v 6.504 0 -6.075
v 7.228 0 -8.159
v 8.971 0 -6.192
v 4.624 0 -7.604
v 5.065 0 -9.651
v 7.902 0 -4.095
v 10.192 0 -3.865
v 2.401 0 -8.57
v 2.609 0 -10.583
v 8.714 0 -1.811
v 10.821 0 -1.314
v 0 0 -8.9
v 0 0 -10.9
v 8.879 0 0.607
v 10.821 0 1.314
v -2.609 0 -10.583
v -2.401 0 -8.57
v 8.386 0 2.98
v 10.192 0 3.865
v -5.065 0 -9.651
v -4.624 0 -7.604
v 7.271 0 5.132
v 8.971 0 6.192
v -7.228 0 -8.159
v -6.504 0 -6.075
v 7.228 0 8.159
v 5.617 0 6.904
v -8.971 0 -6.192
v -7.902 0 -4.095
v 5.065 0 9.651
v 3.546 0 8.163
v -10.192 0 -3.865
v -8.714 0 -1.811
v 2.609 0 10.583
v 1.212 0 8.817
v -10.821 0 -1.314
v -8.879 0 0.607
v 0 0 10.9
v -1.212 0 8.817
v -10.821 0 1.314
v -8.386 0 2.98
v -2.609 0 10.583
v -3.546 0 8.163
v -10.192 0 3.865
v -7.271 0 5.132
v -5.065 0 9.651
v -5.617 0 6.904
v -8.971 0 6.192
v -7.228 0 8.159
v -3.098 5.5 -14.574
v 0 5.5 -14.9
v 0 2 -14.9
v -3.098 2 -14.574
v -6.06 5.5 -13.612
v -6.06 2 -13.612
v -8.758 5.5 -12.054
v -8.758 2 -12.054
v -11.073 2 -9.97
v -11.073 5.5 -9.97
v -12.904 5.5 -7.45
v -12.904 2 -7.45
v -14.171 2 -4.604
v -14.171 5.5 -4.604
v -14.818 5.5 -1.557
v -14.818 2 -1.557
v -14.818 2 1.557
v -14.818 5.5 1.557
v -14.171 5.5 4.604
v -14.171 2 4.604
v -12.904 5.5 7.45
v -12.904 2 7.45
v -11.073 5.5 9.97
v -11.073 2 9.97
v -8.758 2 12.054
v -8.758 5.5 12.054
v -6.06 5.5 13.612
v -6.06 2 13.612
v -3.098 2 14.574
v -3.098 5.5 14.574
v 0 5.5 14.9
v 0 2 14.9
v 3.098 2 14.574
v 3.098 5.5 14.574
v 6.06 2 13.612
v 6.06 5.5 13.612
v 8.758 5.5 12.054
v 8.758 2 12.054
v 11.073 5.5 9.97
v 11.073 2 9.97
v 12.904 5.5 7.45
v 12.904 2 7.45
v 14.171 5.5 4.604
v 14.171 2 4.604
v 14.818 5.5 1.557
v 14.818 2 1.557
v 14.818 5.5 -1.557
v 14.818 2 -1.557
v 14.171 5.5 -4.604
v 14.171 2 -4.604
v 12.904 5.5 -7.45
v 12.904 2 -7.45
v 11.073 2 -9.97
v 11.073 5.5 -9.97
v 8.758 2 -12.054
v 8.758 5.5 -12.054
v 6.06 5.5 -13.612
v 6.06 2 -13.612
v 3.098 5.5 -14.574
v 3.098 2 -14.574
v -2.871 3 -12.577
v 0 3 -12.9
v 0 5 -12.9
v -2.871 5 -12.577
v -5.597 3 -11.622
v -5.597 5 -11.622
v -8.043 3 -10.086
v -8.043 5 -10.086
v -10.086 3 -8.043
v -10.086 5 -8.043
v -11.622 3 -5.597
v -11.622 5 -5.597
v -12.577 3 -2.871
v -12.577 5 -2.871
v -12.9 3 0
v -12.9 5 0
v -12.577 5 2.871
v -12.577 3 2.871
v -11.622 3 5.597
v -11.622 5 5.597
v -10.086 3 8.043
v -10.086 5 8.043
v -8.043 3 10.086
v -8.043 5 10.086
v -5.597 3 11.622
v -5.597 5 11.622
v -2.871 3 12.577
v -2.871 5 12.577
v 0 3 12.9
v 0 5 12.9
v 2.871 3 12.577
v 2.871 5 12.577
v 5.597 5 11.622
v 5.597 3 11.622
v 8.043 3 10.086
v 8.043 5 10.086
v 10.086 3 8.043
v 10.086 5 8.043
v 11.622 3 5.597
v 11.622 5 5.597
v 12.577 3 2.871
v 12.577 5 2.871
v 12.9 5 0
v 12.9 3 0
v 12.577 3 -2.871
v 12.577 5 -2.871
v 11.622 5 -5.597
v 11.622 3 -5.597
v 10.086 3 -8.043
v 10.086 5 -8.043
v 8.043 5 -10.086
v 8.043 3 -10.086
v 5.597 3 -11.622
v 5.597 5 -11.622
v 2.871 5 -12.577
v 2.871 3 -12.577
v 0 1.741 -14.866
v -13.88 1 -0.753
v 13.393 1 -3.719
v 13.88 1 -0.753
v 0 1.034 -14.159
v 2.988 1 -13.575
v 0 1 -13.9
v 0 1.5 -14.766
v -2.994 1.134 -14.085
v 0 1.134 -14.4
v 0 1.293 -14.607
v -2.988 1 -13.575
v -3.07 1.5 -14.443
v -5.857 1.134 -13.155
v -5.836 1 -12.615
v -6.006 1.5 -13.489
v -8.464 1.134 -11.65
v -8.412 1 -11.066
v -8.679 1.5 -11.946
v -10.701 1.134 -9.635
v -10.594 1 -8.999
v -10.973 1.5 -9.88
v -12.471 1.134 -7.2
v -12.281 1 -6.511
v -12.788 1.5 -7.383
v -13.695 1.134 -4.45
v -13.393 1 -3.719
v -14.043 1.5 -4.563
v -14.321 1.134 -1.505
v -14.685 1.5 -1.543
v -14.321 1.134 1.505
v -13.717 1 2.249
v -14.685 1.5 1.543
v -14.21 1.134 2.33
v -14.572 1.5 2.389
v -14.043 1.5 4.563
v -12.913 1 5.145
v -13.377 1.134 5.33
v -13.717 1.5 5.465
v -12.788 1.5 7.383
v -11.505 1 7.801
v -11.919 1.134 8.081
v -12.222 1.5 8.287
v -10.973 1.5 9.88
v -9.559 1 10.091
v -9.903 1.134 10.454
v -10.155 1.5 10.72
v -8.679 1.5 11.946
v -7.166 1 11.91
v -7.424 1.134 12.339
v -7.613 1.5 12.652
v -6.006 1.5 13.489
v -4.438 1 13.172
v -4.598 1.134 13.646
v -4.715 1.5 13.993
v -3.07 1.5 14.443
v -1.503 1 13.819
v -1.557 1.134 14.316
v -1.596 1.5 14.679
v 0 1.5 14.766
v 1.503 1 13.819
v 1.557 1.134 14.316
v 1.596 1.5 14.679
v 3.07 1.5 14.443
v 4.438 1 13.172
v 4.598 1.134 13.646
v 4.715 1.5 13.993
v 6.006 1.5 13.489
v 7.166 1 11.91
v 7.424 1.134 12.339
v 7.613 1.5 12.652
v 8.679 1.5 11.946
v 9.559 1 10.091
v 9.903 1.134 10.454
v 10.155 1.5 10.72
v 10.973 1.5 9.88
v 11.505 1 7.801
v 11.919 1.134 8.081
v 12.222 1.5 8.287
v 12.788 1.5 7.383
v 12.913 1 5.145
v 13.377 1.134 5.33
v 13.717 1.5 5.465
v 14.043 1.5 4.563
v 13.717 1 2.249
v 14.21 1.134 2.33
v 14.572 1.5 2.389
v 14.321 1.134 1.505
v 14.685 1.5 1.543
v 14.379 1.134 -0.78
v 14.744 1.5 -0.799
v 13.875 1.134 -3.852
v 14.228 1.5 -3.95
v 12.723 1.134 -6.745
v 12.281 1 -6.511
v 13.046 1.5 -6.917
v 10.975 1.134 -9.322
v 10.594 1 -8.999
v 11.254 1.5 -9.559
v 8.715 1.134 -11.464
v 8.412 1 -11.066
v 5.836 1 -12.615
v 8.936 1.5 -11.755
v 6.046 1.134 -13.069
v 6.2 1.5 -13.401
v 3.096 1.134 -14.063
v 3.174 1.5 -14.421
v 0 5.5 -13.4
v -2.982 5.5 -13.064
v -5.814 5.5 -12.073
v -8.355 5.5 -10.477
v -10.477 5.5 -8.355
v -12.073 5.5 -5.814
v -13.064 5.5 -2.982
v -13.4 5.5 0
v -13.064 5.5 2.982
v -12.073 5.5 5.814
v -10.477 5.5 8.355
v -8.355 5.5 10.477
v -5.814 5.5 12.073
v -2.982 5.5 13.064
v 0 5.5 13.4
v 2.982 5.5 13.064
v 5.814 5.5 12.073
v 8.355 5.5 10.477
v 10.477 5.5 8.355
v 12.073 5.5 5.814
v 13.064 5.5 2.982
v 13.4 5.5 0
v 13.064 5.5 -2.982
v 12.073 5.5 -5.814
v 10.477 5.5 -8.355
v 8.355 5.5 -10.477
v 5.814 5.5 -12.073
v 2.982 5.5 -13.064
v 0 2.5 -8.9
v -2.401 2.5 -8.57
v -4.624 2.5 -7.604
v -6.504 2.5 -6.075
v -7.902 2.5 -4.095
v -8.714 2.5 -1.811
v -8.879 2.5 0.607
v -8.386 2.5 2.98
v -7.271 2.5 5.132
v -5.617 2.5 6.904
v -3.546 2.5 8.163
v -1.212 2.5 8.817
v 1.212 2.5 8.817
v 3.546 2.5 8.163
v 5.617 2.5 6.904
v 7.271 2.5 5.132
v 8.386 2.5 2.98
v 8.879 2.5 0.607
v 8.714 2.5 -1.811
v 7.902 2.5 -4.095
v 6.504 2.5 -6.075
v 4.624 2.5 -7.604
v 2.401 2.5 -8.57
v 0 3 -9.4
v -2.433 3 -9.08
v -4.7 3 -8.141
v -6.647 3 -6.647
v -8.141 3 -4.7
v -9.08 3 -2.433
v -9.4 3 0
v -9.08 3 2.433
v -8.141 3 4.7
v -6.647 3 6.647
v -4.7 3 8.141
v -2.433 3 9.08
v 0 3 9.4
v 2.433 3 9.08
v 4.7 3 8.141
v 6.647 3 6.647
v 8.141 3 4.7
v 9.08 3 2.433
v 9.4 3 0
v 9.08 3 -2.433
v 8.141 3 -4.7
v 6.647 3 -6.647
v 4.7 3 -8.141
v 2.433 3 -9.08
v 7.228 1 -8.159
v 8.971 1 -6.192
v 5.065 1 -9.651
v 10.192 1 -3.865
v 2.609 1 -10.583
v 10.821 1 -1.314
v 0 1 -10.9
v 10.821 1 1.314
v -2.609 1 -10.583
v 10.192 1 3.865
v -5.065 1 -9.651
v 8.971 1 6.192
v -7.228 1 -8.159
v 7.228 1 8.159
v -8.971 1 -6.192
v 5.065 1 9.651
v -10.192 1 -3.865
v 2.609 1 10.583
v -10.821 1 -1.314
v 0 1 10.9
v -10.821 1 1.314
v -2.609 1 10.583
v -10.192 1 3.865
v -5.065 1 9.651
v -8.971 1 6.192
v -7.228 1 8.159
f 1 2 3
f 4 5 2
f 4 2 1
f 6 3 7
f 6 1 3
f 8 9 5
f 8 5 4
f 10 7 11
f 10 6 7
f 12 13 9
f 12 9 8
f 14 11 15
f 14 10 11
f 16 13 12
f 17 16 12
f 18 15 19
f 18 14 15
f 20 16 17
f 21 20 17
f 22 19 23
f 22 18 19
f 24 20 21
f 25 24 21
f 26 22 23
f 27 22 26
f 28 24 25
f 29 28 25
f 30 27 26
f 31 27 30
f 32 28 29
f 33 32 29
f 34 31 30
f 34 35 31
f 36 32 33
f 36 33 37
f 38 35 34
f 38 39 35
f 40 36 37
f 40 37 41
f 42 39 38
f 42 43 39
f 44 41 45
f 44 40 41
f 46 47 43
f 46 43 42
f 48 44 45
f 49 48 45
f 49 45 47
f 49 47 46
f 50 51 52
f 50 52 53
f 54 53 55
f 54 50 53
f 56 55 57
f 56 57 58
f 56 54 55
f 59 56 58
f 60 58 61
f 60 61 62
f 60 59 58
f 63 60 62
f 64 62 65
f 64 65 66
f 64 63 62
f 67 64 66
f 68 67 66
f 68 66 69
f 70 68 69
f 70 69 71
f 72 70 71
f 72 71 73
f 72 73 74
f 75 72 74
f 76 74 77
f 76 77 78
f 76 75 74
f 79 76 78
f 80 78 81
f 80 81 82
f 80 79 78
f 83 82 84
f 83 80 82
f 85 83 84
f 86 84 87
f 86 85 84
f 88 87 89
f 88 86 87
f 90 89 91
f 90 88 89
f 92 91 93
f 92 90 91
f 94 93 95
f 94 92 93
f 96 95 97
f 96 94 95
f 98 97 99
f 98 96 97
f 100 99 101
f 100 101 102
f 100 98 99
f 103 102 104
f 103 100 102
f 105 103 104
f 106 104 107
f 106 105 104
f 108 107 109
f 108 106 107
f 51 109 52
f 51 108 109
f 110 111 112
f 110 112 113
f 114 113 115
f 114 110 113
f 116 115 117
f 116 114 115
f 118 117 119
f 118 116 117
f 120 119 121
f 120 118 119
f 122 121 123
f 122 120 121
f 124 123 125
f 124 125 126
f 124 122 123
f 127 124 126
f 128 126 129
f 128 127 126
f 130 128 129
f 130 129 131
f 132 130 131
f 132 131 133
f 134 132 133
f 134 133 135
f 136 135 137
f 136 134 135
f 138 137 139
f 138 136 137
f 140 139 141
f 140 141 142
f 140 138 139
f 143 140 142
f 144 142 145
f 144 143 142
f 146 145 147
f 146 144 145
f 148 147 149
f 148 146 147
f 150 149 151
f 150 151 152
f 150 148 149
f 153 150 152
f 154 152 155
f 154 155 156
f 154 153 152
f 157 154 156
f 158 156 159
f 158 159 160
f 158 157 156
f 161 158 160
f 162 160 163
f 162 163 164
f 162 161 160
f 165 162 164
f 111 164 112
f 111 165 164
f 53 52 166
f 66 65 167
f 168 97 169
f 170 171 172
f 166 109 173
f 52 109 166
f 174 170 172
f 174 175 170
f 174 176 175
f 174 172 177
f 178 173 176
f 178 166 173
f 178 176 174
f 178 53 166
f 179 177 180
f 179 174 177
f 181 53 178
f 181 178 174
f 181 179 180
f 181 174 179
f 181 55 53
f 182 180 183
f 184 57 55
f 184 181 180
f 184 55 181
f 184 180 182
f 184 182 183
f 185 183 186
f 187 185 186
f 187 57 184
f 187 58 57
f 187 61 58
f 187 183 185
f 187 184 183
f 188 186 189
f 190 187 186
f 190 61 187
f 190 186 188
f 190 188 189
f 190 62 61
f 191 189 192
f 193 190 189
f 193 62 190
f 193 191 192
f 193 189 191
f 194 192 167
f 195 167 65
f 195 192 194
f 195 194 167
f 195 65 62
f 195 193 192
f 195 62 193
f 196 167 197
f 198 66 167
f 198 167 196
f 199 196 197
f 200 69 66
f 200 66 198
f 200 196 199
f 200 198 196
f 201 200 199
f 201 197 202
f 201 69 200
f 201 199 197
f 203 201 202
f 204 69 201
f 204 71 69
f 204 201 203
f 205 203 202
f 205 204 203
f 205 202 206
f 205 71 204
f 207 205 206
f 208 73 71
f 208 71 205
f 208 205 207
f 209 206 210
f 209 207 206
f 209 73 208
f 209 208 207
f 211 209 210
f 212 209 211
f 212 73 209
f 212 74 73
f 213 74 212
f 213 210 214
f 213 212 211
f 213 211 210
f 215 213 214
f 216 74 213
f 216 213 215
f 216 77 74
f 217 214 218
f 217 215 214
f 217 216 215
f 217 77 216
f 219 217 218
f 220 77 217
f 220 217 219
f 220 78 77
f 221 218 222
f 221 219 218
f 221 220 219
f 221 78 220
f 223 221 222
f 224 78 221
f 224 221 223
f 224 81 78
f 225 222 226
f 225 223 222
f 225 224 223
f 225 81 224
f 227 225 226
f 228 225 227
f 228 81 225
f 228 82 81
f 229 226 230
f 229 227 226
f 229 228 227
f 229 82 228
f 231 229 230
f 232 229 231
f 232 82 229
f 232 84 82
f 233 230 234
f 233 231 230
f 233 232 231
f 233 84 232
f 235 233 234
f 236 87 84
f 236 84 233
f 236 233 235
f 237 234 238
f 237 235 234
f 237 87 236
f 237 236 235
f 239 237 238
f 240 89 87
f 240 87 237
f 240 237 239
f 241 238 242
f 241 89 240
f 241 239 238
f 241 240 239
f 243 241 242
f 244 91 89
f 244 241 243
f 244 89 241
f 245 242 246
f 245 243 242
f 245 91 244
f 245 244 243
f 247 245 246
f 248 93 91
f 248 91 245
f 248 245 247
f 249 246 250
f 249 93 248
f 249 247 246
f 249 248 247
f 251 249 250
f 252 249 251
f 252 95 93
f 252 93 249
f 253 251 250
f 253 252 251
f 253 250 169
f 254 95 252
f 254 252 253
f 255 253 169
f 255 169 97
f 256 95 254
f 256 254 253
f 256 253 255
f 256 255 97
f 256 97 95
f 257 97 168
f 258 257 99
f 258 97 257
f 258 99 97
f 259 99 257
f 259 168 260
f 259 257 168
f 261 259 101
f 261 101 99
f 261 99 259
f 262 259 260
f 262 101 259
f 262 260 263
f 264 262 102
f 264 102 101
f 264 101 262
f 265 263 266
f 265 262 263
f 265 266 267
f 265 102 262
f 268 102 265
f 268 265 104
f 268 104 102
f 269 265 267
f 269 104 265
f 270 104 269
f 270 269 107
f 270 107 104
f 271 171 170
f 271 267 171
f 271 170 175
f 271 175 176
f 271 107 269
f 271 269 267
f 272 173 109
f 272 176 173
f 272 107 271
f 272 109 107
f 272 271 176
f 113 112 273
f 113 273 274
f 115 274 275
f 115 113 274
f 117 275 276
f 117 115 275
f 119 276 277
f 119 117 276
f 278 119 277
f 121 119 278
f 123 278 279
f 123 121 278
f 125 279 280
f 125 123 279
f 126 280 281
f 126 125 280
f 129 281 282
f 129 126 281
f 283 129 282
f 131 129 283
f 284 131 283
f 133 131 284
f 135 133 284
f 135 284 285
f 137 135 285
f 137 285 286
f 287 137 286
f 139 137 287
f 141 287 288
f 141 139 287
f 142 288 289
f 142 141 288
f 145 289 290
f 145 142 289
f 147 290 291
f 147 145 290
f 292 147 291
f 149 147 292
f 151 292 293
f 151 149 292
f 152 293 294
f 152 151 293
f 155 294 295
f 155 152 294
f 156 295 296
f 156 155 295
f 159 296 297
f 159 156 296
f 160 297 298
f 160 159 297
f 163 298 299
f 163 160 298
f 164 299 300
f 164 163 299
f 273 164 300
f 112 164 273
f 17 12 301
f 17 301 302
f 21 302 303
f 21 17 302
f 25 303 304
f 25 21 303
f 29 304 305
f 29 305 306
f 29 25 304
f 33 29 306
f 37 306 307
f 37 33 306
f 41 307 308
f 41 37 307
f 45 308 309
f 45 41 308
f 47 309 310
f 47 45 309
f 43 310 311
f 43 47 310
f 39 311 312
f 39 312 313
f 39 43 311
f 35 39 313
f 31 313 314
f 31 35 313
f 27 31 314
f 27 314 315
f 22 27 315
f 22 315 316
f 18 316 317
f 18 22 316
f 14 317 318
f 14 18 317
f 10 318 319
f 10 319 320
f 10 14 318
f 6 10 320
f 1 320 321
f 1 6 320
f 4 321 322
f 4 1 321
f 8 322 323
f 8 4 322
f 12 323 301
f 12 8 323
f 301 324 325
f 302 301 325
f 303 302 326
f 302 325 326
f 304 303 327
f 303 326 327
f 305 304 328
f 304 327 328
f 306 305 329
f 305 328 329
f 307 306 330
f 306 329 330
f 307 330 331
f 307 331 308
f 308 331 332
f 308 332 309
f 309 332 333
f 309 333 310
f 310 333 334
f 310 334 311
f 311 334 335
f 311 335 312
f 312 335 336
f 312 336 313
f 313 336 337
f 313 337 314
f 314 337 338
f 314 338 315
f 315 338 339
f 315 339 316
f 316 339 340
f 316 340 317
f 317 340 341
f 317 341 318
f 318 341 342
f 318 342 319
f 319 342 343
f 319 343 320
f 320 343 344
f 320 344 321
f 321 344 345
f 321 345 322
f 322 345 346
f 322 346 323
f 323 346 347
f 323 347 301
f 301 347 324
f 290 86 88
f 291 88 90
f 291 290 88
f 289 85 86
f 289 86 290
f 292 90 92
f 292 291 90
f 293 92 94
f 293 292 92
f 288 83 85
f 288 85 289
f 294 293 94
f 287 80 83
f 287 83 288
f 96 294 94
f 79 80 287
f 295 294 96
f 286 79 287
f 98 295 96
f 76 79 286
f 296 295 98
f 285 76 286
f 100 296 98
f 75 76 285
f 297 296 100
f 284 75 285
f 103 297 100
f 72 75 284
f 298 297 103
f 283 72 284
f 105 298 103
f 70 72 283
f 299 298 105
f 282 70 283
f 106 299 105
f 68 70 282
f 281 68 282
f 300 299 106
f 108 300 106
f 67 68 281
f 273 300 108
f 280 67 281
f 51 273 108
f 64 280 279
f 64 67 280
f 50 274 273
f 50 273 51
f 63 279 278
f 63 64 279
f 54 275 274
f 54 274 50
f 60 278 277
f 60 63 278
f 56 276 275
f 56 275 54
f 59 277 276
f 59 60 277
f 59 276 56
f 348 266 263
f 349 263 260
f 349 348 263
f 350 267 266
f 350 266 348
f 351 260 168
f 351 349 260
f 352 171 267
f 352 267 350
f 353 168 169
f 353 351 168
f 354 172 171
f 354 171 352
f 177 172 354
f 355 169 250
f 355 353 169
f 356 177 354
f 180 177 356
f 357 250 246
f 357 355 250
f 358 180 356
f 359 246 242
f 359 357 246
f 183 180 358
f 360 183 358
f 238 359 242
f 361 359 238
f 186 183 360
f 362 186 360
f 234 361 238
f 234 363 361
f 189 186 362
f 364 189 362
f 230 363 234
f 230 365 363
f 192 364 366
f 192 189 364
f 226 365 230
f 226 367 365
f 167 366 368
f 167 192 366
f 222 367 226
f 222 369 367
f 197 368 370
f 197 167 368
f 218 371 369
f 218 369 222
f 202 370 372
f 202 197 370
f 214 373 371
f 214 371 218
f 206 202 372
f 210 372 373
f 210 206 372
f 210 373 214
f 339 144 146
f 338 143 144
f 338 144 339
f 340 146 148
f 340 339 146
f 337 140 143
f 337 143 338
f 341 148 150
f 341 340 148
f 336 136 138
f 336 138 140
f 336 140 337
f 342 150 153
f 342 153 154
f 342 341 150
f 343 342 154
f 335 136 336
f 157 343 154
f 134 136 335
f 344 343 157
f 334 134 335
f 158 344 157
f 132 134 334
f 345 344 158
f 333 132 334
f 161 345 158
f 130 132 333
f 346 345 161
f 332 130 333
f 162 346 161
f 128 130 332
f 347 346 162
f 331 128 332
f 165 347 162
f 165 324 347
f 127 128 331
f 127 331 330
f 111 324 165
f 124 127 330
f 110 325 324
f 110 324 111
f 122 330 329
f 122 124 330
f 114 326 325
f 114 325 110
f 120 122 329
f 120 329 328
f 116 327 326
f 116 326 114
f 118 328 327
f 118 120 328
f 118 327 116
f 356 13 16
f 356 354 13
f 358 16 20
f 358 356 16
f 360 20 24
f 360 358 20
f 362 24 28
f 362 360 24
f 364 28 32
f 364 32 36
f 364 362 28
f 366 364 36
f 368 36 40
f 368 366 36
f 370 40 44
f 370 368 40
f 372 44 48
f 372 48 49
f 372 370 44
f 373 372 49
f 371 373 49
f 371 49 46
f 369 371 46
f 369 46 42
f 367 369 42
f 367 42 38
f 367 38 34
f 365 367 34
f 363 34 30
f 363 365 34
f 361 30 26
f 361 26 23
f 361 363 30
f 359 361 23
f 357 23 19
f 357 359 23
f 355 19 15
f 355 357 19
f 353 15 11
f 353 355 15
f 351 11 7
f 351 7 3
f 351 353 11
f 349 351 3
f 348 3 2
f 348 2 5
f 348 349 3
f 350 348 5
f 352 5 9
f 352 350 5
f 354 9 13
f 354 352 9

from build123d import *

# Parameters (mm, degrees)
FILLET1_R     = 1
CHAMFER1_SIZE = 0.5


with BuildPart() as part:
    # Sketch1 → Revolve1 (revolve)
    with BuildSketch(Plane.XY, mode=Mode.PRIVATE) as revolve1_sk:
        Polygon((12.9, 5.5), (12.9, 3), (8.9, 3), (8.9, 0), (10.9, 0), (10.9, 1), (14.9, 1), (14.9, 5.5), align=None)
    revolve(revolve1_sk.sketch.rotate(Axis((0, 0, 0), (0, 1, 0)), 90), axis=Axis((0, 0, 0), (0, 1, 0)))

    # Fillet1
    fillet1_edges = [part.edges().sort_by_distance(p)[0] for p in [
        (0, 1, 14.9),
    ]]
    fillet(fillet1_edges, radius=FILLET1_R)

    # Chamfer1
    chamfer1_edges = [part.edges().sort_by_distance(p)[0] for p in [
        (0, 5.5, 12.9),
        (0, 3, 8.9),
    ]]
    chamfer(chamfer1_edges, length=CHAMFER1_SIZE)


solid = part.part
